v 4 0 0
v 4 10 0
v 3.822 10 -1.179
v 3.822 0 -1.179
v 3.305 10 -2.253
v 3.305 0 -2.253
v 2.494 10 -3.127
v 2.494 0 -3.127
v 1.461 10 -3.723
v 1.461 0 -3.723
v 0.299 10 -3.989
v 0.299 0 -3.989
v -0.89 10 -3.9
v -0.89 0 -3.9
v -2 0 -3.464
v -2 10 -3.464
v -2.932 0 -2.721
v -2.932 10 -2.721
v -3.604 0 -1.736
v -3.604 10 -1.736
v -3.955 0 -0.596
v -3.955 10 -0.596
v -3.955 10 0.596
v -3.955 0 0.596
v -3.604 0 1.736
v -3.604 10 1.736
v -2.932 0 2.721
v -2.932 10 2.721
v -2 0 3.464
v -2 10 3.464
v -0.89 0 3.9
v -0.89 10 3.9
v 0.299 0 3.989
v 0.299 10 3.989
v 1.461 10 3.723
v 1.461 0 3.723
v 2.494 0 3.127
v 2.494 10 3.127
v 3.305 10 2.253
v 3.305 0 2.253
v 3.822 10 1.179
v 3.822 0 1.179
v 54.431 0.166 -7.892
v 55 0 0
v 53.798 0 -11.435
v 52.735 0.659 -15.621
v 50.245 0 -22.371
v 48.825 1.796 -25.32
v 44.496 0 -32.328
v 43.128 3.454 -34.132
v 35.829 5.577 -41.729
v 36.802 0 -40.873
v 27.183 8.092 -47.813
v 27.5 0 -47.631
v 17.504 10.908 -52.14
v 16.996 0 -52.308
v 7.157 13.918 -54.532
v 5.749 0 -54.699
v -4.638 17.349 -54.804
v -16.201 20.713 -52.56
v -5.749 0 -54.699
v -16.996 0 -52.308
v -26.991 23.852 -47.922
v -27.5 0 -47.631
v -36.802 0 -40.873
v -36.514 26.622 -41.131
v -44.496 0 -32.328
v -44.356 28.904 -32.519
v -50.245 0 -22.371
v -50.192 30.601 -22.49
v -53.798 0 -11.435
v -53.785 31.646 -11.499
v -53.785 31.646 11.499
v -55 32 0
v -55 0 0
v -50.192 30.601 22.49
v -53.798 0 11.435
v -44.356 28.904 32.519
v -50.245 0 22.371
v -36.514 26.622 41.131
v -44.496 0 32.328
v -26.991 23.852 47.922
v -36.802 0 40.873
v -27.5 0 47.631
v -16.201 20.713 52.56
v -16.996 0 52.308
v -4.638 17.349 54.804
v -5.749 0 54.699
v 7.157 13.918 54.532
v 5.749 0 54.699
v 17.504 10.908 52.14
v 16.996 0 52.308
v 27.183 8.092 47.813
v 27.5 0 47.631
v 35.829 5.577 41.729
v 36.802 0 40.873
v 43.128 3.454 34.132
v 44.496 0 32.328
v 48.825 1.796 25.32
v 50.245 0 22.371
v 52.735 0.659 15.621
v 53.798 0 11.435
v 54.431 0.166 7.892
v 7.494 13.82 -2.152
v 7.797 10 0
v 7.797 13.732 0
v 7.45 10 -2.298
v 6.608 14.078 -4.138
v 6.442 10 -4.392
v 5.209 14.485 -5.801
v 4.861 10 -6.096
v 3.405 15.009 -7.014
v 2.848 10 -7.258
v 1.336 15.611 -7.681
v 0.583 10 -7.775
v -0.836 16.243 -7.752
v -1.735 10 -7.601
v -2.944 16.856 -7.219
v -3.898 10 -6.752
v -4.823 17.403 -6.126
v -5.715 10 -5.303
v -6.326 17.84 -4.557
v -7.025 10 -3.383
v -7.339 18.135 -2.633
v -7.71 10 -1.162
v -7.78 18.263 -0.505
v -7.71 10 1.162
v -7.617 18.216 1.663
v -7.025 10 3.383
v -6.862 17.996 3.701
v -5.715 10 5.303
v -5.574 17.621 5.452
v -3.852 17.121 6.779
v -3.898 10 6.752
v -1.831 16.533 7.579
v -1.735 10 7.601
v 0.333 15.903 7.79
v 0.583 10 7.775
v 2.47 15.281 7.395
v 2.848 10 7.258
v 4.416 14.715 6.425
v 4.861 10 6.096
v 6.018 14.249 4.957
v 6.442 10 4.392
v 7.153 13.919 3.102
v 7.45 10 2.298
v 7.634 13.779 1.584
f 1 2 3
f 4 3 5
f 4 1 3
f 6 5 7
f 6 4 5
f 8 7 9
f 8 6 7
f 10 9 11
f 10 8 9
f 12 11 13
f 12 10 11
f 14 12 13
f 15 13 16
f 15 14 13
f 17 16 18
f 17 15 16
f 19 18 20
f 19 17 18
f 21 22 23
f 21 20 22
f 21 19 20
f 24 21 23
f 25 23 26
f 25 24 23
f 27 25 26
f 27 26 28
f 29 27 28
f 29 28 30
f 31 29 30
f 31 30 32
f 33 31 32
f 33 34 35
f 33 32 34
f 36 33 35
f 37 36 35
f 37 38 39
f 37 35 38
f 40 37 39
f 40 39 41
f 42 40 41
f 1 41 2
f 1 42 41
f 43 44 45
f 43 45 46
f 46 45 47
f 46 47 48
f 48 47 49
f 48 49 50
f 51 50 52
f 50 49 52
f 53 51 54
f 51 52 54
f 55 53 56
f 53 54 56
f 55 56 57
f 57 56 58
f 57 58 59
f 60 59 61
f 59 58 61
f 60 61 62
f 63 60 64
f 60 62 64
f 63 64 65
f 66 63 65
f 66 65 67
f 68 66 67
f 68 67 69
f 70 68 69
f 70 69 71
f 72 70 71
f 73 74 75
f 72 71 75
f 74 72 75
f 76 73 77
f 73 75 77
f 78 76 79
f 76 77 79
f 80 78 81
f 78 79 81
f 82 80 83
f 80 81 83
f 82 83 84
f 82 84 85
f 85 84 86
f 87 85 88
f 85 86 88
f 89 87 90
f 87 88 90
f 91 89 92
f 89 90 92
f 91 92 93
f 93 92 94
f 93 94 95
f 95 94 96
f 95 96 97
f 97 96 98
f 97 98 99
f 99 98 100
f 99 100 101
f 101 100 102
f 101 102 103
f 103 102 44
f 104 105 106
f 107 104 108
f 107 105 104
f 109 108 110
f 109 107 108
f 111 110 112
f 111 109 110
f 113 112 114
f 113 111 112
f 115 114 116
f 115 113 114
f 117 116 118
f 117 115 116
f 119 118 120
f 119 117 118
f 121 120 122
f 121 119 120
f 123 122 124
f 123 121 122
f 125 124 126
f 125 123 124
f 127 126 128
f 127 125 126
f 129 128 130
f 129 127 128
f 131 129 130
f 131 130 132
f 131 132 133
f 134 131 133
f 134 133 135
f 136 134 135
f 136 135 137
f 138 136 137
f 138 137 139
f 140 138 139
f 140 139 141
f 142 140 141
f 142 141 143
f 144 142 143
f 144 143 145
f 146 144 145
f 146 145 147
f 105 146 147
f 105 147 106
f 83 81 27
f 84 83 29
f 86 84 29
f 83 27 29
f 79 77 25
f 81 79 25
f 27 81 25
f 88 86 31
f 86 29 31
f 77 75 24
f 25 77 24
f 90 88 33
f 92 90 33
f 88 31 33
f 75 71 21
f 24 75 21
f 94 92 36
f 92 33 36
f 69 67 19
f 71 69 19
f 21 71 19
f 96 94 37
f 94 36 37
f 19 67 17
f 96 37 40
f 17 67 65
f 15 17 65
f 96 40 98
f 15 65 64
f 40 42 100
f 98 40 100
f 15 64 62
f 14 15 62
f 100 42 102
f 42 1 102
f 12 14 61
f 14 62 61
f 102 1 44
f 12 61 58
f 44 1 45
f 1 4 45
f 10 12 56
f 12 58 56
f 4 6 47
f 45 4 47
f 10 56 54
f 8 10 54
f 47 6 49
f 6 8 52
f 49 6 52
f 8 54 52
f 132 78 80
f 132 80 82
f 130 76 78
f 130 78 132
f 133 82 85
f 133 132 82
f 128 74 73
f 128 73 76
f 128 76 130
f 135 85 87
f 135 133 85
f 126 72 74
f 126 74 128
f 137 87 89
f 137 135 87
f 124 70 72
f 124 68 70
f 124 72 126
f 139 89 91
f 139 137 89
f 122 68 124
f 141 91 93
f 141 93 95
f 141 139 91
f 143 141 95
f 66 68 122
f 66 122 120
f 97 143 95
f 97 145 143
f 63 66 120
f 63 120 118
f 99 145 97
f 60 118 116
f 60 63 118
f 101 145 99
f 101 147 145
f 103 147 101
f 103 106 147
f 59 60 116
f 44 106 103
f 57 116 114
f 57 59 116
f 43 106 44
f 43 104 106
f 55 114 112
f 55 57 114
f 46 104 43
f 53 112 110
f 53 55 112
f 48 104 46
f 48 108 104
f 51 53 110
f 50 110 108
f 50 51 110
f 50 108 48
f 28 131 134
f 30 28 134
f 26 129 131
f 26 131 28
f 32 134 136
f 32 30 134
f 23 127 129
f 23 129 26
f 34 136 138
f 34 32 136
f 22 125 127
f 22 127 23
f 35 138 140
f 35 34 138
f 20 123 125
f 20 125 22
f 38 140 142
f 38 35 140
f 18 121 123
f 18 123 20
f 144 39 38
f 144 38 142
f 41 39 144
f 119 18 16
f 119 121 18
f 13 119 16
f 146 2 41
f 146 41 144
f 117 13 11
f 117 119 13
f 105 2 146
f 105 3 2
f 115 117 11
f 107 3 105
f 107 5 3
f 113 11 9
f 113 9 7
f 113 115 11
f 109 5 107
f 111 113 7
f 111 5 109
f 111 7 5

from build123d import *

# Parameters (mm, degrees)
SKETCH1_R               = 55
SKETCH1_R_2             = 4
BOSS_EXTRUDE1_DEPTH     = 32
CUT_EXTRUDE1_DEPTH      = 56
CUT_EXTRUDE1_DEPTH_BACK = 56
SKETCH4_R               = 7.796617101
CUT_EXTRUDE2_DEPTH      = 23


with BuildPart() as part:
    # Sketch1 → Boss-Extrude1 (new body)
    with BuildSketch(Plane(origin=(0, 0, 0), x_dir=(1, 0, 0), z_dir=(0, 1, 0))):
        Circle(SKETCH1_R)
        Circle(SKETCH1_R_2, mode=Mode.SUBTRACT)
    extrude(amount=BOSS_EXTRUDE1_DEPTH)

    # Sketch3 → Cut-Extrude1 (cut, two sides)
    with BuildSketch(Plane.XY) as cut_extrude1_sk:
        Polygon((55, 0), (55, 32), (-55, 32), align=None)
    extrude(amount=CUT_EXTRUDE1_DEPTH, mode=Mode.SUBTRACT)
    extrude(cut_extrude1_sk.sketch, amount=-CUT_EXTRUDE1_DEPTH_BACK, mode=Mode.SUBTRACT)

    # Sketch4 → Cut-Extrude2 (cut, through all)
    with BuildSketch(Plane(origin=(0, 10, 0), x_dir=(1, 0, 0), z_dir=(0, 1, 0))):
        Circle(SKETCH4_R)
    extrude(amount=CUT_EXTRUDE2_DEPTH, mode=Mode.SUBTRACT)


solid = part.part
